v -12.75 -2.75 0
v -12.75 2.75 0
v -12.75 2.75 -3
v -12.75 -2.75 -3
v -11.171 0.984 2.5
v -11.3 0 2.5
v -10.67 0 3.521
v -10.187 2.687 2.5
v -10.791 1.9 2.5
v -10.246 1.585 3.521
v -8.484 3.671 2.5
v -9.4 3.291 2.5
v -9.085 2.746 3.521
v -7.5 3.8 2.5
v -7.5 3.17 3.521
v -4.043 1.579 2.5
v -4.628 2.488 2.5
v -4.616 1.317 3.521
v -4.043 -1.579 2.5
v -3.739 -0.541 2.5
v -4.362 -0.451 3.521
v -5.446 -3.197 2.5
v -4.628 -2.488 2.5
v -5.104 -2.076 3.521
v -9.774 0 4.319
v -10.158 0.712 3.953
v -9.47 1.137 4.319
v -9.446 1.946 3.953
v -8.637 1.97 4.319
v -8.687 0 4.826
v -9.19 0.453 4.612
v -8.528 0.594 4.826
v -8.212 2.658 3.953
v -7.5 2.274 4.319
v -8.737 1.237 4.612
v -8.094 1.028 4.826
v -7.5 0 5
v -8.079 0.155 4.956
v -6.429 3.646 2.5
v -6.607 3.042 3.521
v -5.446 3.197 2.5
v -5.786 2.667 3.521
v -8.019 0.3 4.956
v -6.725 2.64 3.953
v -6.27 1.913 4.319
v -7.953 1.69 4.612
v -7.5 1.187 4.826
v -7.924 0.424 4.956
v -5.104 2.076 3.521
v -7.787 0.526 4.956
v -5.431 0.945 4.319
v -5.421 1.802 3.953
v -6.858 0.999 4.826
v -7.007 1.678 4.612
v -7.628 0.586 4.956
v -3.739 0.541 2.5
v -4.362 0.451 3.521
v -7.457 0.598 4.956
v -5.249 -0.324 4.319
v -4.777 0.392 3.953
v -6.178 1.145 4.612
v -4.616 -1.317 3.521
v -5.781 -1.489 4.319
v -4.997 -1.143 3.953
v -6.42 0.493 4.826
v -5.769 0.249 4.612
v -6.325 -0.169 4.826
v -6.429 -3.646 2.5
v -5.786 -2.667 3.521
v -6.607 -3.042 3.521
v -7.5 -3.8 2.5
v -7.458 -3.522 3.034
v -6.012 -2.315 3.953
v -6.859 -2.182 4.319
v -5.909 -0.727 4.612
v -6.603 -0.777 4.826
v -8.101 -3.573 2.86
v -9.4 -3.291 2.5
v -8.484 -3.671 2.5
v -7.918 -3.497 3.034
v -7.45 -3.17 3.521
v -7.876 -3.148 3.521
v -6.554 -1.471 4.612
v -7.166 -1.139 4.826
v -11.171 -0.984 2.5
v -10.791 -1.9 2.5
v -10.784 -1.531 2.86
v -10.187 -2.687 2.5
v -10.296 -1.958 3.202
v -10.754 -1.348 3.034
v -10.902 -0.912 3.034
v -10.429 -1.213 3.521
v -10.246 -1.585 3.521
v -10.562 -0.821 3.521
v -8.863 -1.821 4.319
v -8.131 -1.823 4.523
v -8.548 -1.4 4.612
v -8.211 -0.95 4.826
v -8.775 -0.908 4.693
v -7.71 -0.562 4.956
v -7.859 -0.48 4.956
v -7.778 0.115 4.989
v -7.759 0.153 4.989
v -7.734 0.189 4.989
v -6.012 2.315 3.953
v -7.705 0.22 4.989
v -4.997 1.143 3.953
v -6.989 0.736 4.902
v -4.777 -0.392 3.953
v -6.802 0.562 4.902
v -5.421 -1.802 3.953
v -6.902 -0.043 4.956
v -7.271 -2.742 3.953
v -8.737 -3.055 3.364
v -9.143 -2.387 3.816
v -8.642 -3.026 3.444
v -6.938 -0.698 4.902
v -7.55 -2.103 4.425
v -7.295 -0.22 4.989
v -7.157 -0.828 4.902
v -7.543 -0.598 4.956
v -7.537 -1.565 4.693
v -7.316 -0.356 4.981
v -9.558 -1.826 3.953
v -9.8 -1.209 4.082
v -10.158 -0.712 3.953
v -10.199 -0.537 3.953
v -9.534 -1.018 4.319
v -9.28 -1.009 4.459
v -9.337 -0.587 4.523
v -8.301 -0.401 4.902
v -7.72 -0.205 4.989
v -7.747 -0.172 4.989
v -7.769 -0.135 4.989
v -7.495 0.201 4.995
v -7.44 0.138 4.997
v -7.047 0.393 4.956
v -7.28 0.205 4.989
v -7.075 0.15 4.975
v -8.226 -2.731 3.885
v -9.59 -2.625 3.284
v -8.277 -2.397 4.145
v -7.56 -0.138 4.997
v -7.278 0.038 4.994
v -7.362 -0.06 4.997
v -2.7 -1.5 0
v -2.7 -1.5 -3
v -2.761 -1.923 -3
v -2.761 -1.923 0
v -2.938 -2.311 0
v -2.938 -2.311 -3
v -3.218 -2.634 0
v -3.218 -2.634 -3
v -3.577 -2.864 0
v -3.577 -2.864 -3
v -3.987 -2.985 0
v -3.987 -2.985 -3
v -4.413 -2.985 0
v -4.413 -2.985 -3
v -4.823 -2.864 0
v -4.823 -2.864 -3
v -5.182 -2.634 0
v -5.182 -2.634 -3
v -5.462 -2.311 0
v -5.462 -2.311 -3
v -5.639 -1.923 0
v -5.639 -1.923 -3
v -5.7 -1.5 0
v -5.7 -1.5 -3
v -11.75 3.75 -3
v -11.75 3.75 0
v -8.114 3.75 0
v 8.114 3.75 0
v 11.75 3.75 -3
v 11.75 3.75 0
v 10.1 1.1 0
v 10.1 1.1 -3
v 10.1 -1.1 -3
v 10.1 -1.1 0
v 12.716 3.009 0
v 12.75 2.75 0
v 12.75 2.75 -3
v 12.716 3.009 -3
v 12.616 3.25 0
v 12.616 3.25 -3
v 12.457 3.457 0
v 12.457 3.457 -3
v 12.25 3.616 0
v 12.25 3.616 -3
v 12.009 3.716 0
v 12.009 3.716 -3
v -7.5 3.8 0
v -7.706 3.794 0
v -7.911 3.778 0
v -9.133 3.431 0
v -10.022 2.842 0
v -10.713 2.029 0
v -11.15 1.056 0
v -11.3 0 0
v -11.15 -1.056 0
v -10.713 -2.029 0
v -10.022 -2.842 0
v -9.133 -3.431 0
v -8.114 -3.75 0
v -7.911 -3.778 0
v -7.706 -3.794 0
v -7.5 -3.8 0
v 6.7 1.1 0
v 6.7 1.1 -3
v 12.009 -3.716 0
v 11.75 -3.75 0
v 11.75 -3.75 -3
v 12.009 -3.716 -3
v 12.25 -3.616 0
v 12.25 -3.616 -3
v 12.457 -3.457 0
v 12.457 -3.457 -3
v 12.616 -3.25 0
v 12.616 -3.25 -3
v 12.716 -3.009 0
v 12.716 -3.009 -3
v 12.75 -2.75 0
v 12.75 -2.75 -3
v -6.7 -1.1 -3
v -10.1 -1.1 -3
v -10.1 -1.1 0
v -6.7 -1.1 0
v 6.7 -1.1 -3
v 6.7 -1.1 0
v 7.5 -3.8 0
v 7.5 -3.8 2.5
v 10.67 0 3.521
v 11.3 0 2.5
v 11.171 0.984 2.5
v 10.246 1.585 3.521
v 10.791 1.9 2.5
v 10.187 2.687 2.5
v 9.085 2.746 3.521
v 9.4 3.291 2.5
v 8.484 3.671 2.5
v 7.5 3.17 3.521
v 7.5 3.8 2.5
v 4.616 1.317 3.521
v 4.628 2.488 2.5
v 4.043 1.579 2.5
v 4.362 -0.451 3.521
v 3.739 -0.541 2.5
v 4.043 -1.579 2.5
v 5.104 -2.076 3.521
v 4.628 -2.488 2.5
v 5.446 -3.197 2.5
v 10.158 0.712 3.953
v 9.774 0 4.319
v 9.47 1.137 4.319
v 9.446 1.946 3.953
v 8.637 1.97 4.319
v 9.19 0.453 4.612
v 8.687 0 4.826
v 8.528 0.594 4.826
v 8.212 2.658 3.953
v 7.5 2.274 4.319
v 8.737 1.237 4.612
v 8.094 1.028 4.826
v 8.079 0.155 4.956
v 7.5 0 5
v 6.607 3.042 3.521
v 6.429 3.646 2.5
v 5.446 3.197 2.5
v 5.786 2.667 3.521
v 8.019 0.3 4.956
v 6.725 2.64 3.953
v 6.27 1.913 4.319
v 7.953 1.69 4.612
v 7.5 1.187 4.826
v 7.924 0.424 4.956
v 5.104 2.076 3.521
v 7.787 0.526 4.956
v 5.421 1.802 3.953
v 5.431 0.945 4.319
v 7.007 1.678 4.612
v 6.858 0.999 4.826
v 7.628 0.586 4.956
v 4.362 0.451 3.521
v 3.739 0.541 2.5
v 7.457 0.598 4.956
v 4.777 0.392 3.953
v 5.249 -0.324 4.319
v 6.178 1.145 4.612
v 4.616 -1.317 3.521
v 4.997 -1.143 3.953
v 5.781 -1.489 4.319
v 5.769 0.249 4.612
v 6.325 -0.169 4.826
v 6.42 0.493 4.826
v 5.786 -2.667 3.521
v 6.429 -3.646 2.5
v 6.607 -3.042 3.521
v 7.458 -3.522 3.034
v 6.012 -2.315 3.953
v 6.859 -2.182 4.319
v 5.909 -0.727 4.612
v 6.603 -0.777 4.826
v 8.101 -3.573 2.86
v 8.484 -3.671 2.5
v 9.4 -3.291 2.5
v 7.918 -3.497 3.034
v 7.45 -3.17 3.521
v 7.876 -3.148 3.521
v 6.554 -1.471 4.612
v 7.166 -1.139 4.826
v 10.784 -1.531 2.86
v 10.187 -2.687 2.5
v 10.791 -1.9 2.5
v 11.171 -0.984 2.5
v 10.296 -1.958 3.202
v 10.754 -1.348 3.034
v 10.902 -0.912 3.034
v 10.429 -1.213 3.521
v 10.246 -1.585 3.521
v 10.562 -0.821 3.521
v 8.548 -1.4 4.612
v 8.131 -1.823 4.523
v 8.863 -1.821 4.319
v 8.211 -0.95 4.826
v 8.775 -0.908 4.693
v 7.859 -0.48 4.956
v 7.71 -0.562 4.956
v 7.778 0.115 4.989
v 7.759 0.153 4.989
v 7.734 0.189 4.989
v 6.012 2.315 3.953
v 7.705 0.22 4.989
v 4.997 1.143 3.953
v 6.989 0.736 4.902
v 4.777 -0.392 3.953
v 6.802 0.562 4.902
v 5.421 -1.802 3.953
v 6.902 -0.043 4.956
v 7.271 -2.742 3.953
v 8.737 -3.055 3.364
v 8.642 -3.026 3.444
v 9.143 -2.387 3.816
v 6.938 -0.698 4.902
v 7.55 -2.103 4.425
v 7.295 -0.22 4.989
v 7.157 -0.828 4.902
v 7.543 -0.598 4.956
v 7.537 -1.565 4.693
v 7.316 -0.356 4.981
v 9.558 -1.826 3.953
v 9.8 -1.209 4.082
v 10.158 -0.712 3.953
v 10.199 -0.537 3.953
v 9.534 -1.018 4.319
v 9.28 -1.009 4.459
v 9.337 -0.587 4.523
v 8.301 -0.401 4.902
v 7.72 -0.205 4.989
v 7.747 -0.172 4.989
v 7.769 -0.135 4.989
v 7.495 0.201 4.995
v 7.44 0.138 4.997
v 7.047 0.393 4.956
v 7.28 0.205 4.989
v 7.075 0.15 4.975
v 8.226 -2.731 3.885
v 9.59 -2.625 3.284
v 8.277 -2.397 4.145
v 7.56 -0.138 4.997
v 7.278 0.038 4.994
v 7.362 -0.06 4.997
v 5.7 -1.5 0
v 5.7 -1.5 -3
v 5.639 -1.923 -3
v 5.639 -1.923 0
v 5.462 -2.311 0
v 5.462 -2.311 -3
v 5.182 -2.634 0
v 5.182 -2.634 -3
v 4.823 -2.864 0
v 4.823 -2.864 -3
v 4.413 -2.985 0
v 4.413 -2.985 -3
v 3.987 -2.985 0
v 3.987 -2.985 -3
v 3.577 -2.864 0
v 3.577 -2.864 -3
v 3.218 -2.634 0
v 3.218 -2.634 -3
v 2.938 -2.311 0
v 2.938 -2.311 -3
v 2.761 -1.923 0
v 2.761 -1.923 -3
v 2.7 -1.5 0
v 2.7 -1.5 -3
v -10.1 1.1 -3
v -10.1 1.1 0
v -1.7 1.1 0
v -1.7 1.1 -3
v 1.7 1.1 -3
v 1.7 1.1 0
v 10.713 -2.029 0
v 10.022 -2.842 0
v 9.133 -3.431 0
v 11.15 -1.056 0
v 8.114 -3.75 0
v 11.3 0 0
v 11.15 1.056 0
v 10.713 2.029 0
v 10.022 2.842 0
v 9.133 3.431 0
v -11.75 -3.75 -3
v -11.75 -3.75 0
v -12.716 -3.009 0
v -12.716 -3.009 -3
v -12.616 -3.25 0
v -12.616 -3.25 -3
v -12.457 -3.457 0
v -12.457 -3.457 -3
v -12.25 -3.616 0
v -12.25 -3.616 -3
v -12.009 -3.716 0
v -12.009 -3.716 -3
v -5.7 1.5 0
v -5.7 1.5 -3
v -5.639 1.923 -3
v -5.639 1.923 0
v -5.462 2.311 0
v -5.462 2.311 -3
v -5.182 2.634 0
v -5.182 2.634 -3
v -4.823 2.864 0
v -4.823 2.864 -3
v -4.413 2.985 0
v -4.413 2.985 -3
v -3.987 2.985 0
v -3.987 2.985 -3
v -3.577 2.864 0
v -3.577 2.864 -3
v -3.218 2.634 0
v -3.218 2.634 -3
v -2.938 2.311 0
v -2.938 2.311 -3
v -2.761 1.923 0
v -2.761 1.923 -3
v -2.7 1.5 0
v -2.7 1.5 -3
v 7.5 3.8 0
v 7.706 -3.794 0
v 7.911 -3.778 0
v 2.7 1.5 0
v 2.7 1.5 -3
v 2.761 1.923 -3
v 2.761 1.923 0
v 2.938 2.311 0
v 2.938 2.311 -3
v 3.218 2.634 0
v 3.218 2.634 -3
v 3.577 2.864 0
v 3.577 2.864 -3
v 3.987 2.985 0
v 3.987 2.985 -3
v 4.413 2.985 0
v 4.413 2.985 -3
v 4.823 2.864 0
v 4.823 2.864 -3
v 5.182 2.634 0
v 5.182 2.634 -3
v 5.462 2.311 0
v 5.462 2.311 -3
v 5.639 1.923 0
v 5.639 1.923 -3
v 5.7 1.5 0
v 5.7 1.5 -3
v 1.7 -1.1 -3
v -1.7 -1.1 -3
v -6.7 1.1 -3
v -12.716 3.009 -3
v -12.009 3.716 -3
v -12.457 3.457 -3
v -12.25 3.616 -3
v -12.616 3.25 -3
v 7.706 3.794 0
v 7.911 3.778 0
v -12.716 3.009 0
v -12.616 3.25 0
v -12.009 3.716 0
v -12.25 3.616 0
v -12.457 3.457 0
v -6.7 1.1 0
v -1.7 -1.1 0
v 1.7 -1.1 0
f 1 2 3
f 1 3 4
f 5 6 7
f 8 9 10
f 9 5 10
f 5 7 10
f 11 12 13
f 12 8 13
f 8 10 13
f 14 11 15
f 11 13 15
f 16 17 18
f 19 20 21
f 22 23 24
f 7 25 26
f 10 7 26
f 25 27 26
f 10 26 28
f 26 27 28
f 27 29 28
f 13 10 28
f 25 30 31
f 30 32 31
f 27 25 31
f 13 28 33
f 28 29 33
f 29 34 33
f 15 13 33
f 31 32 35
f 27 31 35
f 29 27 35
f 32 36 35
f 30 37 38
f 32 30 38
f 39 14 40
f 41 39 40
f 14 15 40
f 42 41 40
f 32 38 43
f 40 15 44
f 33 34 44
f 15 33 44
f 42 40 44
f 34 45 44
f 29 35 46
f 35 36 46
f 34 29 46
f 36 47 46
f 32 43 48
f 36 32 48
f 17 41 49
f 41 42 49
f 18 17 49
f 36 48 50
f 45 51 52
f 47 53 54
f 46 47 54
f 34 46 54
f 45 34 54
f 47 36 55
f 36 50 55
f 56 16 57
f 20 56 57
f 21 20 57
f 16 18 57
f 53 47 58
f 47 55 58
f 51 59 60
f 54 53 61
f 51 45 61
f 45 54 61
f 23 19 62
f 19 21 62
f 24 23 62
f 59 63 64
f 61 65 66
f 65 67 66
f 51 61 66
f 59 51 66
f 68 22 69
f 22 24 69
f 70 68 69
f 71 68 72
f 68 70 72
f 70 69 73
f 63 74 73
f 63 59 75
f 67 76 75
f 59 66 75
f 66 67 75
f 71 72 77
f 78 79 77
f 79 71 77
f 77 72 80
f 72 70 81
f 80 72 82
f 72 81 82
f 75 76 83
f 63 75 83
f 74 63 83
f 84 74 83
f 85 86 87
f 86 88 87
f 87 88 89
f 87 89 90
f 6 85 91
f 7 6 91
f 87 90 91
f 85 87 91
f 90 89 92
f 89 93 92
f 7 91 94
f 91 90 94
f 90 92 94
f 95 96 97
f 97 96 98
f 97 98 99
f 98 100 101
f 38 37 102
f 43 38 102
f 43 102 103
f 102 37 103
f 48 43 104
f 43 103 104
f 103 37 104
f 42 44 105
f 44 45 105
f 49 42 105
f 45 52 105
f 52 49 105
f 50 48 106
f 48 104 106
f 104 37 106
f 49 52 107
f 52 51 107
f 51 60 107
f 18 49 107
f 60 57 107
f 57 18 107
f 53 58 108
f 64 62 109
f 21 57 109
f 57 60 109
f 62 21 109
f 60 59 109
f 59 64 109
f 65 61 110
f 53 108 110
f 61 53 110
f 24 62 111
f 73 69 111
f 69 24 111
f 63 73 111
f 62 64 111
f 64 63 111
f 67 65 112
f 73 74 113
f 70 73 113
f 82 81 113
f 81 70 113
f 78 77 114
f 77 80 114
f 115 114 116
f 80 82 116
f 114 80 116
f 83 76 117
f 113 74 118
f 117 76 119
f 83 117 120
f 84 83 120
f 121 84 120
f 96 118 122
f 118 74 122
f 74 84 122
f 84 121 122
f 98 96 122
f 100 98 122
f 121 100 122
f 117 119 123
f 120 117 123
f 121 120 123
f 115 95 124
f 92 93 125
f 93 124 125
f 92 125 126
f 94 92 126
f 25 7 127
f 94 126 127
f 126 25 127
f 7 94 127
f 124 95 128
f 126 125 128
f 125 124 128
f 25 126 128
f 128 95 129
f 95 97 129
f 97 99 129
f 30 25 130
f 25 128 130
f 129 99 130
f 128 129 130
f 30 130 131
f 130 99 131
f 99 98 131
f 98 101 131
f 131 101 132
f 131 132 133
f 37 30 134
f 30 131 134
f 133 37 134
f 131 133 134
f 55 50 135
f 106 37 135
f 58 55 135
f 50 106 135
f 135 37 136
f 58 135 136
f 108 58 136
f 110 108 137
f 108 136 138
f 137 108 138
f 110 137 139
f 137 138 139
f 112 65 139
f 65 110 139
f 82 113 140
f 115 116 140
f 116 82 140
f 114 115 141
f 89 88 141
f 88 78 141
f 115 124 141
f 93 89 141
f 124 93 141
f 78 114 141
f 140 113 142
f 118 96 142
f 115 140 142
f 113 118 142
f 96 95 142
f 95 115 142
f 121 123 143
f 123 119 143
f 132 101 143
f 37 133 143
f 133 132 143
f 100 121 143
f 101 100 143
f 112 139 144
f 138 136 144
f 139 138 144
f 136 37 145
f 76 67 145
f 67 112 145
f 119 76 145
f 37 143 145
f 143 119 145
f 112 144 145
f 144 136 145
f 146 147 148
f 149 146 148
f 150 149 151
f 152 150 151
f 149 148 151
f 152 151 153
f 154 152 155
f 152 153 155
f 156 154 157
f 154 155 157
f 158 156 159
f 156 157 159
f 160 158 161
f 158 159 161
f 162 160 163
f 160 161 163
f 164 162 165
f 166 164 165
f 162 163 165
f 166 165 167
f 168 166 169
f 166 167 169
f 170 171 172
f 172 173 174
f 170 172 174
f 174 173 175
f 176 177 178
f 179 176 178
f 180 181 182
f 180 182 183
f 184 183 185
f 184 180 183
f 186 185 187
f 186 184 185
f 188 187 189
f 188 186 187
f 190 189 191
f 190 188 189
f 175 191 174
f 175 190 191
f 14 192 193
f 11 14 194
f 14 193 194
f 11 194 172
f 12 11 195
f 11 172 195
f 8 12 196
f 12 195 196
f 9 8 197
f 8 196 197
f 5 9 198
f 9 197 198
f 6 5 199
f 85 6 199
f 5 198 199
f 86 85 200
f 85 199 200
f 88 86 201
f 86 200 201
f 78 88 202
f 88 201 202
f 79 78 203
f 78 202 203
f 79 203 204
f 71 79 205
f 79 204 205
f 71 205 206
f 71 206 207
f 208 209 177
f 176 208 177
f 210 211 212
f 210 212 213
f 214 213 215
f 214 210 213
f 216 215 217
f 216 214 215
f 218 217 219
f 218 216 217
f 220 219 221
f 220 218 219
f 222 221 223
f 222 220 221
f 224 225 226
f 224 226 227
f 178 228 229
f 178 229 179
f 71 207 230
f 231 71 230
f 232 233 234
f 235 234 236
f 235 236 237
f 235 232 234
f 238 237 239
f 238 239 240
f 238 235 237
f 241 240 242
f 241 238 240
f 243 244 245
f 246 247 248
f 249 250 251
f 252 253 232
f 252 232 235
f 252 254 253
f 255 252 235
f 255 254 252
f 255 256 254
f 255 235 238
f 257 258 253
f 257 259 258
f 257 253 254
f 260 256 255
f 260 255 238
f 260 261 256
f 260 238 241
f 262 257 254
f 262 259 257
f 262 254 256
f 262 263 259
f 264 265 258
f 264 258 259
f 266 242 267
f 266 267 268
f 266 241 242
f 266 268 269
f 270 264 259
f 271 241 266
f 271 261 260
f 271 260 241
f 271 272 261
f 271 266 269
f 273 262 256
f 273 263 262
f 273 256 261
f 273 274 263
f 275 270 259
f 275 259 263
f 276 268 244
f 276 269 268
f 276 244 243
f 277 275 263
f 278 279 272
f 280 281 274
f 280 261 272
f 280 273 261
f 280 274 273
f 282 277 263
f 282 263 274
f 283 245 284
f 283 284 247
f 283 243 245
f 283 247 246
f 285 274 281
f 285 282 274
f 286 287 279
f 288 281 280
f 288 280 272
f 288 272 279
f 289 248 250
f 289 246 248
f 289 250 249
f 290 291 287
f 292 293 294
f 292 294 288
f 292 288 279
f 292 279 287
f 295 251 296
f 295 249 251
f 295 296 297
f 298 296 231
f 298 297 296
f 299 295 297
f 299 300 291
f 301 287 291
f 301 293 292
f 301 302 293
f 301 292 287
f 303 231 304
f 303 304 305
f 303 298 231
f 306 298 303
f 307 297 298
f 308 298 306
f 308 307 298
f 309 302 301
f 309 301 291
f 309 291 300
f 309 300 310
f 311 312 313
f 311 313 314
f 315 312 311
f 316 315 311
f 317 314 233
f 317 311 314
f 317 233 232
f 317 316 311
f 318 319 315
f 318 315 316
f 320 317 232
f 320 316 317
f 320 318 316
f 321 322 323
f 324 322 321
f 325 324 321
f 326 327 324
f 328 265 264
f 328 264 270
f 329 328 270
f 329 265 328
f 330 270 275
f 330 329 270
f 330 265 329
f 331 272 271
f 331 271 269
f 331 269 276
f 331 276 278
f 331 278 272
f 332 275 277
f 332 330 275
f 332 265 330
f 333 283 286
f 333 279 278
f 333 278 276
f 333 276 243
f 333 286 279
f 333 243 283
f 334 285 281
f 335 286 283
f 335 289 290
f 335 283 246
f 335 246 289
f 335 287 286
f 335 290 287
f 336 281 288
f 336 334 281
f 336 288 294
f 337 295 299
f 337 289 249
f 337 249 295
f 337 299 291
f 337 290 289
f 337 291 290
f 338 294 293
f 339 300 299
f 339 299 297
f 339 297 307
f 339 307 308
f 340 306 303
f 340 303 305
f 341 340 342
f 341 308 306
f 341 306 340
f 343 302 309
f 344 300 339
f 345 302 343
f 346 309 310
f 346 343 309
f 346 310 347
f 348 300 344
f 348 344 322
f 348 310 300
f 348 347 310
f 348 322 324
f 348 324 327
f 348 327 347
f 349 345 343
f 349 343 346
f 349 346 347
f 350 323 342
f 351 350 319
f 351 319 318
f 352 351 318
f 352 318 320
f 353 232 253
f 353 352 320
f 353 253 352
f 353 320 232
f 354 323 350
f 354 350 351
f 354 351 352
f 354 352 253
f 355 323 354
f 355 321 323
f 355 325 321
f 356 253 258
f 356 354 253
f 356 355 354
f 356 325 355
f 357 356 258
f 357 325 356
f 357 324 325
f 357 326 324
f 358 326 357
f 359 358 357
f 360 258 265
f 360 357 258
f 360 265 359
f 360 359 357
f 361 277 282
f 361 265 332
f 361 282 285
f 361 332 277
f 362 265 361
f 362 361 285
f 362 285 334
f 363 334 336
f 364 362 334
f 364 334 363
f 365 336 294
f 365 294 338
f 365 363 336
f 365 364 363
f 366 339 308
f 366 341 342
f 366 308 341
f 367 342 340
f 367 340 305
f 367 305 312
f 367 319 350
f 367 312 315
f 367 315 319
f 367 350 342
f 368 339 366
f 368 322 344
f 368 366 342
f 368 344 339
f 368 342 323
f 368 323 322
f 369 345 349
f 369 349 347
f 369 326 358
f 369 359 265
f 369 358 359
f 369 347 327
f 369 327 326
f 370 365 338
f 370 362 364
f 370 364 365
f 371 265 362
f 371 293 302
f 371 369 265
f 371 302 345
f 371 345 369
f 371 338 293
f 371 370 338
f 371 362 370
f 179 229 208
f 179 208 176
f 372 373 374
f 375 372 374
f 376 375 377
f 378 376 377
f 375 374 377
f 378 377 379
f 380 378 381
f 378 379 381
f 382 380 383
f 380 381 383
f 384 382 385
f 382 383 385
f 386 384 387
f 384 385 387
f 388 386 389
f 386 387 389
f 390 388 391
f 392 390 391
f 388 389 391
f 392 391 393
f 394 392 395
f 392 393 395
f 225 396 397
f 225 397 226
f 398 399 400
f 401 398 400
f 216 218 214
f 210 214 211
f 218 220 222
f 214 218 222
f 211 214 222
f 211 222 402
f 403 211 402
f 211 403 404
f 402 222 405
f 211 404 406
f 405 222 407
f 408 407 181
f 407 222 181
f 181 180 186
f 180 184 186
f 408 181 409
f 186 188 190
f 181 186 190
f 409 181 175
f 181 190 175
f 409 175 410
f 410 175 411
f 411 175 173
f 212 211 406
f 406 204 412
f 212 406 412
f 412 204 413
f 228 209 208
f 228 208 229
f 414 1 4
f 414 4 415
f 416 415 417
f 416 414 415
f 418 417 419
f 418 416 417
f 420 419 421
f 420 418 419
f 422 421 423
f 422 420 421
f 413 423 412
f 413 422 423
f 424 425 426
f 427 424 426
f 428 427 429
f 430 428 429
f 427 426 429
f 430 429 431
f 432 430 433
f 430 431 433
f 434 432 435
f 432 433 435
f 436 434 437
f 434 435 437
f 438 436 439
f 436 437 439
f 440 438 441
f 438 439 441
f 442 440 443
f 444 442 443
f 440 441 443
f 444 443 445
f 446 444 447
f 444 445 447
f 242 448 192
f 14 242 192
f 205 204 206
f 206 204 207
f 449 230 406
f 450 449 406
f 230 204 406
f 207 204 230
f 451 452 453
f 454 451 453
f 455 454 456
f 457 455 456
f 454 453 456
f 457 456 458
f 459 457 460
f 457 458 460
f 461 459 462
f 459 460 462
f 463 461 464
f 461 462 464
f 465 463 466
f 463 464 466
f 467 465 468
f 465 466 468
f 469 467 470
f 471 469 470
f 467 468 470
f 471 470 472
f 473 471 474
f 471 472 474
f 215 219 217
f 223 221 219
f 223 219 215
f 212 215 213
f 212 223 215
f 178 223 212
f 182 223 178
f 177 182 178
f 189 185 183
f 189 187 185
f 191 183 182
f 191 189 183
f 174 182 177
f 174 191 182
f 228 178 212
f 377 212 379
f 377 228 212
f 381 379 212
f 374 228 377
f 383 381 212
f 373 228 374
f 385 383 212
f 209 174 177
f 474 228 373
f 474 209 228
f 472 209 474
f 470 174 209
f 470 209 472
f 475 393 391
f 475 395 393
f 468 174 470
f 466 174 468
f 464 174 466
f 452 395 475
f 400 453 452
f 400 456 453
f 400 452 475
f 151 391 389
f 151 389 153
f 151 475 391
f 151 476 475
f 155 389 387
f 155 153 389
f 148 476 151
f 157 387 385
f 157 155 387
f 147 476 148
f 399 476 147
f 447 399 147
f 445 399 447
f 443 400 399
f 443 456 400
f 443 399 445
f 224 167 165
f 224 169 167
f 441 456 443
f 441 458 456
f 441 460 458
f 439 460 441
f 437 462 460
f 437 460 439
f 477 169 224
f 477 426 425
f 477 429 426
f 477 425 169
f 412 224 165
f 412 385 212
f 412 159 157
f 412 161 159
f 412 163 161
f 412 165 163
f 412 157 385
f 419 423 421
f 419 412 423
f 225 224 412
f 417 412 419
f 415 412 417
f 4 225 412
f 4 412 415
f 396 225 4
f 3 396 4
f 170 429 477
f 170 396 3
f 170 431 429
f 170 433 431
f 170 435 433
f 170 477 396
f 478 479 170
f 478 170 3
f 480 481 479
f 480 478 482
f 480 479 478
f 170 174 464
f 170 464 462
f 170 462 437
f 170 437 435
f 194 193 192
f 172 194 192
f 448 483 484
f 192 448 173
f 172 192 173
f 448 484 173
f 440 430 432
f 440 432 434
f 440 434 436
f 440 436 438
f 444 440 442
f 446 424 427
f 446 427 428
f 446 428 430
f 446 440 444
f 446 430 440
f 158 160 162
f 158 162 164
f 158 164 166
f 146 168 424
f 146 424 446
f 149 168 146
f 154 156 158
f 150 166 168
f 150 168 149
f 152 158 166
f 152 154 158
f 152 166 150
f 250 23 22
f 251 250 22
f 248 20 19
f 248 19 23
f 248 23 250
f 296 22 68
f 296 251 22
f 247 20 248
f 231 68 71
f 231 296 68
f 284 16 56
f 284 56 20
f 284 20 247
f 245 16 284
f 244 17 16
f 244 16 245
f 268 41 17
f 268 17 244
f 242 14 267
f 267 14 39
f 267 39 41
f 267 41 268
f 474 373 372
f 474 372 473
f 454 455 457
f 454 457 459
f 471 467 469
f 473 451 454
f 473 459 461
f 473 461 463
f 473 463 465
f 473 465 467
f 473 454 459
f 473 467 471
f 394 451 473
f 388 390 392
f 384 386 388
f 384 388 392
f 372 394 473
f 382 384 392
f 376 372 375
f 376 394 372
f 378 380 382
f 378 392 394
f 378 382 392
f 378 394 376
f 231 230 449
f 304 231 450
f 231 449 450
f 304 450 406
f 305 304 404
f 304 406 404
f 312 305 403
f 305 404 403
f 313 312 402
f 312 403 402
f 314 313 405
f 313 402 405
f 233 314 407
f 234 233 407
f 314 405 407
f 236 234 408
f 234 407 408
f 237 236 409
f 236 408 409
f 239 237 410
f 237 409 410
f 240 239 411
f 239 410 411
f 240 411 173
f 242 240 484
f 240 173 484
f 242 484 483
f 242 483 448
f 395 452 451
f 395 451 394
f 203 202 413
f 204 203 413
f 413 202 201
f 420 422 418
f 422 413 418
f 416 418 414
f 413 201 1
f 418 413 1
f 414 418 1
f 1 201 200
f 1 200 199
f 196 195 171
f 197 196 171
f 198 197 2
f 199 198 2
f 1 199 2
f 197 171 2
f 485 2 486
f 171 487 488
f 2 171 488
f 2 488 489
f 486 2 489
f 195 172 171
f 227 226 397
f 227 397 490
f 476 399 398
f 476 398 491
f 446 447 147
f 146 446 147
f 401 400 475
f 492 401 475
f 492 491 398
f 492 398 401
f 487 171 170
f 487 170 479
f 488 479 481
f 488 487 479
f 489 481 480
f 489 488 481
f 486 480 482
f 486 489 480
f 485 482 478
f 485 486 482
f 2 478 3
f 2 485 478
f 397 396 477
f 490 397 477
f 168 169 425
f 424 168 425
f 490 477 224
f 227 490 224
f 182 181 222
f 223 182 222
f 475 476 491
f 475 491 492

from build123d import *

# Parameters (mm, degrees)
PAD036_DEPTH    = 2.5
PAD037_DEPTH    = 3
SKETCH094_W     = 3.4
SKETCH094_H     = 2.2
POCKET015_DEPTH = 3


with BuildPart() as part:
    # Sketch066 → Pad036 (new body)
    with BuildSketch(Plane.XY):
        with BuildLine():
            ThreePointArc((-7.5, 3.8), (-11.3, 0), (-7.5, -3.8))
            Line((-7.5, -3.8), (7.5, -3.8))
            ThreePointArc((7.5, -3.8), (11.3, 0), (7.5, 3.8))
            Line((7.5, 3.8), (-7.5, 3.8))
        make_face()
    extrude(amount=PAD036_DEPTH)

    # Sketch067 → Pad037 (join)
    with BuildSketch(Plane.XY):
        with BuildLine():
            Line((-11.75, 3.75), (11.75, 3.75))
            ThreePointArc((12.75, 2.75), (12.457107, 3.457107), (11.75, 3.75))
            Line((12.75, 2.75), (12.75, -2.75))
            ThreePointArc((11.75, -3.75), (12.457107, -3.457107), (12.75, -2.75))
            Line((11.75, -3.75), (-11.75, -3.75))
            ThreePointArc((-12.75, -2.75), (-12.457107, -3.457107), (-11.75, -3.75))
            Line((-12.75, 2.75), (-12.75, -2.75))
            ThreePointArc((-11.75, 3.75), (-12.457107, 3.457107), (-12.75, 2.75))
        make_face()
    extrude(amount=-PAD037_DEPTH)

    # Sketch094 (on Face16 of Pad037) → Pocket015 (cut)
    with BuildSketch(Plane(origin=(0, 0, -3), x_dir=(1, 0, 0), z_dir=(0, 0, -1))):
        with Locations((-8.4, 0)):
            Rectangle(SKETCH094_W, SKETCH094_H)
        with Locations((8.4, 0)):
            Rectangle(SKETCH094_W, SKETCH094_H)
        Rectangle(SKETCH094_W, SKETCH094_H)
        with BuildLine():
            ThreePointArc((-2.7, 1.5), (-4.2, 3), (-5.7, 1.5))
            Line((-5.7, 1.5), (-5.7, -1.5))
            ThreePointArc((-5.7, -1.5), (-4.2, -3), (-2.7, -1.5))
            Line((-2.7, -1.5), (-2.7, 1.5))
        make_face()
        with BuildLine():
            ThreePointArc((5.7, 1.5), (4.2, 3), (2.7, 1.5))
            Line((2.7, -1.5), (2.7, 1.5))
            ThreePointArc((2.7, -1.5), (4.2, -3), (5.7, -1.5))
            Line((5.7, 1.5), (5.7, -1.5))
        make_face()
    extrude(amount=-POCKET015_DEPTH, mode=Mode.SUBTRACT)


with BuildPart() as part_1:
    # Body050 placement: moved
    add(part.part.moved(Location((0, 0, 12.5))))


with BuildPart() as part_2:
    # Clone017 placement: moved
    add(part_1.part.moved(Location((0, 0, -12.5))))

    # Sketch095 → Revolution003 (revolve)
    with BuildSketch(Plane(origin=(7.5, 0, 2.5), x_dir=(1, 0, 0), z_dir=(0, -1, 0))):
        with BuildLine():
            Line((0, 2.5), (0, 0))
            Line((0, 0), (3.8, 0))
            ThreePointArc((3.8, 0), (2.274313, 1.818956), (0, 2.5))
        make_face()
    revolution003 = revolve(axis=Axis((7.5, 0, 2.5), (0, 0, 1)))

    # Mirrored014: Revolution003 across YZ
    add(revolution003.mirror(Plane.YZ))


solid = part_2.part
